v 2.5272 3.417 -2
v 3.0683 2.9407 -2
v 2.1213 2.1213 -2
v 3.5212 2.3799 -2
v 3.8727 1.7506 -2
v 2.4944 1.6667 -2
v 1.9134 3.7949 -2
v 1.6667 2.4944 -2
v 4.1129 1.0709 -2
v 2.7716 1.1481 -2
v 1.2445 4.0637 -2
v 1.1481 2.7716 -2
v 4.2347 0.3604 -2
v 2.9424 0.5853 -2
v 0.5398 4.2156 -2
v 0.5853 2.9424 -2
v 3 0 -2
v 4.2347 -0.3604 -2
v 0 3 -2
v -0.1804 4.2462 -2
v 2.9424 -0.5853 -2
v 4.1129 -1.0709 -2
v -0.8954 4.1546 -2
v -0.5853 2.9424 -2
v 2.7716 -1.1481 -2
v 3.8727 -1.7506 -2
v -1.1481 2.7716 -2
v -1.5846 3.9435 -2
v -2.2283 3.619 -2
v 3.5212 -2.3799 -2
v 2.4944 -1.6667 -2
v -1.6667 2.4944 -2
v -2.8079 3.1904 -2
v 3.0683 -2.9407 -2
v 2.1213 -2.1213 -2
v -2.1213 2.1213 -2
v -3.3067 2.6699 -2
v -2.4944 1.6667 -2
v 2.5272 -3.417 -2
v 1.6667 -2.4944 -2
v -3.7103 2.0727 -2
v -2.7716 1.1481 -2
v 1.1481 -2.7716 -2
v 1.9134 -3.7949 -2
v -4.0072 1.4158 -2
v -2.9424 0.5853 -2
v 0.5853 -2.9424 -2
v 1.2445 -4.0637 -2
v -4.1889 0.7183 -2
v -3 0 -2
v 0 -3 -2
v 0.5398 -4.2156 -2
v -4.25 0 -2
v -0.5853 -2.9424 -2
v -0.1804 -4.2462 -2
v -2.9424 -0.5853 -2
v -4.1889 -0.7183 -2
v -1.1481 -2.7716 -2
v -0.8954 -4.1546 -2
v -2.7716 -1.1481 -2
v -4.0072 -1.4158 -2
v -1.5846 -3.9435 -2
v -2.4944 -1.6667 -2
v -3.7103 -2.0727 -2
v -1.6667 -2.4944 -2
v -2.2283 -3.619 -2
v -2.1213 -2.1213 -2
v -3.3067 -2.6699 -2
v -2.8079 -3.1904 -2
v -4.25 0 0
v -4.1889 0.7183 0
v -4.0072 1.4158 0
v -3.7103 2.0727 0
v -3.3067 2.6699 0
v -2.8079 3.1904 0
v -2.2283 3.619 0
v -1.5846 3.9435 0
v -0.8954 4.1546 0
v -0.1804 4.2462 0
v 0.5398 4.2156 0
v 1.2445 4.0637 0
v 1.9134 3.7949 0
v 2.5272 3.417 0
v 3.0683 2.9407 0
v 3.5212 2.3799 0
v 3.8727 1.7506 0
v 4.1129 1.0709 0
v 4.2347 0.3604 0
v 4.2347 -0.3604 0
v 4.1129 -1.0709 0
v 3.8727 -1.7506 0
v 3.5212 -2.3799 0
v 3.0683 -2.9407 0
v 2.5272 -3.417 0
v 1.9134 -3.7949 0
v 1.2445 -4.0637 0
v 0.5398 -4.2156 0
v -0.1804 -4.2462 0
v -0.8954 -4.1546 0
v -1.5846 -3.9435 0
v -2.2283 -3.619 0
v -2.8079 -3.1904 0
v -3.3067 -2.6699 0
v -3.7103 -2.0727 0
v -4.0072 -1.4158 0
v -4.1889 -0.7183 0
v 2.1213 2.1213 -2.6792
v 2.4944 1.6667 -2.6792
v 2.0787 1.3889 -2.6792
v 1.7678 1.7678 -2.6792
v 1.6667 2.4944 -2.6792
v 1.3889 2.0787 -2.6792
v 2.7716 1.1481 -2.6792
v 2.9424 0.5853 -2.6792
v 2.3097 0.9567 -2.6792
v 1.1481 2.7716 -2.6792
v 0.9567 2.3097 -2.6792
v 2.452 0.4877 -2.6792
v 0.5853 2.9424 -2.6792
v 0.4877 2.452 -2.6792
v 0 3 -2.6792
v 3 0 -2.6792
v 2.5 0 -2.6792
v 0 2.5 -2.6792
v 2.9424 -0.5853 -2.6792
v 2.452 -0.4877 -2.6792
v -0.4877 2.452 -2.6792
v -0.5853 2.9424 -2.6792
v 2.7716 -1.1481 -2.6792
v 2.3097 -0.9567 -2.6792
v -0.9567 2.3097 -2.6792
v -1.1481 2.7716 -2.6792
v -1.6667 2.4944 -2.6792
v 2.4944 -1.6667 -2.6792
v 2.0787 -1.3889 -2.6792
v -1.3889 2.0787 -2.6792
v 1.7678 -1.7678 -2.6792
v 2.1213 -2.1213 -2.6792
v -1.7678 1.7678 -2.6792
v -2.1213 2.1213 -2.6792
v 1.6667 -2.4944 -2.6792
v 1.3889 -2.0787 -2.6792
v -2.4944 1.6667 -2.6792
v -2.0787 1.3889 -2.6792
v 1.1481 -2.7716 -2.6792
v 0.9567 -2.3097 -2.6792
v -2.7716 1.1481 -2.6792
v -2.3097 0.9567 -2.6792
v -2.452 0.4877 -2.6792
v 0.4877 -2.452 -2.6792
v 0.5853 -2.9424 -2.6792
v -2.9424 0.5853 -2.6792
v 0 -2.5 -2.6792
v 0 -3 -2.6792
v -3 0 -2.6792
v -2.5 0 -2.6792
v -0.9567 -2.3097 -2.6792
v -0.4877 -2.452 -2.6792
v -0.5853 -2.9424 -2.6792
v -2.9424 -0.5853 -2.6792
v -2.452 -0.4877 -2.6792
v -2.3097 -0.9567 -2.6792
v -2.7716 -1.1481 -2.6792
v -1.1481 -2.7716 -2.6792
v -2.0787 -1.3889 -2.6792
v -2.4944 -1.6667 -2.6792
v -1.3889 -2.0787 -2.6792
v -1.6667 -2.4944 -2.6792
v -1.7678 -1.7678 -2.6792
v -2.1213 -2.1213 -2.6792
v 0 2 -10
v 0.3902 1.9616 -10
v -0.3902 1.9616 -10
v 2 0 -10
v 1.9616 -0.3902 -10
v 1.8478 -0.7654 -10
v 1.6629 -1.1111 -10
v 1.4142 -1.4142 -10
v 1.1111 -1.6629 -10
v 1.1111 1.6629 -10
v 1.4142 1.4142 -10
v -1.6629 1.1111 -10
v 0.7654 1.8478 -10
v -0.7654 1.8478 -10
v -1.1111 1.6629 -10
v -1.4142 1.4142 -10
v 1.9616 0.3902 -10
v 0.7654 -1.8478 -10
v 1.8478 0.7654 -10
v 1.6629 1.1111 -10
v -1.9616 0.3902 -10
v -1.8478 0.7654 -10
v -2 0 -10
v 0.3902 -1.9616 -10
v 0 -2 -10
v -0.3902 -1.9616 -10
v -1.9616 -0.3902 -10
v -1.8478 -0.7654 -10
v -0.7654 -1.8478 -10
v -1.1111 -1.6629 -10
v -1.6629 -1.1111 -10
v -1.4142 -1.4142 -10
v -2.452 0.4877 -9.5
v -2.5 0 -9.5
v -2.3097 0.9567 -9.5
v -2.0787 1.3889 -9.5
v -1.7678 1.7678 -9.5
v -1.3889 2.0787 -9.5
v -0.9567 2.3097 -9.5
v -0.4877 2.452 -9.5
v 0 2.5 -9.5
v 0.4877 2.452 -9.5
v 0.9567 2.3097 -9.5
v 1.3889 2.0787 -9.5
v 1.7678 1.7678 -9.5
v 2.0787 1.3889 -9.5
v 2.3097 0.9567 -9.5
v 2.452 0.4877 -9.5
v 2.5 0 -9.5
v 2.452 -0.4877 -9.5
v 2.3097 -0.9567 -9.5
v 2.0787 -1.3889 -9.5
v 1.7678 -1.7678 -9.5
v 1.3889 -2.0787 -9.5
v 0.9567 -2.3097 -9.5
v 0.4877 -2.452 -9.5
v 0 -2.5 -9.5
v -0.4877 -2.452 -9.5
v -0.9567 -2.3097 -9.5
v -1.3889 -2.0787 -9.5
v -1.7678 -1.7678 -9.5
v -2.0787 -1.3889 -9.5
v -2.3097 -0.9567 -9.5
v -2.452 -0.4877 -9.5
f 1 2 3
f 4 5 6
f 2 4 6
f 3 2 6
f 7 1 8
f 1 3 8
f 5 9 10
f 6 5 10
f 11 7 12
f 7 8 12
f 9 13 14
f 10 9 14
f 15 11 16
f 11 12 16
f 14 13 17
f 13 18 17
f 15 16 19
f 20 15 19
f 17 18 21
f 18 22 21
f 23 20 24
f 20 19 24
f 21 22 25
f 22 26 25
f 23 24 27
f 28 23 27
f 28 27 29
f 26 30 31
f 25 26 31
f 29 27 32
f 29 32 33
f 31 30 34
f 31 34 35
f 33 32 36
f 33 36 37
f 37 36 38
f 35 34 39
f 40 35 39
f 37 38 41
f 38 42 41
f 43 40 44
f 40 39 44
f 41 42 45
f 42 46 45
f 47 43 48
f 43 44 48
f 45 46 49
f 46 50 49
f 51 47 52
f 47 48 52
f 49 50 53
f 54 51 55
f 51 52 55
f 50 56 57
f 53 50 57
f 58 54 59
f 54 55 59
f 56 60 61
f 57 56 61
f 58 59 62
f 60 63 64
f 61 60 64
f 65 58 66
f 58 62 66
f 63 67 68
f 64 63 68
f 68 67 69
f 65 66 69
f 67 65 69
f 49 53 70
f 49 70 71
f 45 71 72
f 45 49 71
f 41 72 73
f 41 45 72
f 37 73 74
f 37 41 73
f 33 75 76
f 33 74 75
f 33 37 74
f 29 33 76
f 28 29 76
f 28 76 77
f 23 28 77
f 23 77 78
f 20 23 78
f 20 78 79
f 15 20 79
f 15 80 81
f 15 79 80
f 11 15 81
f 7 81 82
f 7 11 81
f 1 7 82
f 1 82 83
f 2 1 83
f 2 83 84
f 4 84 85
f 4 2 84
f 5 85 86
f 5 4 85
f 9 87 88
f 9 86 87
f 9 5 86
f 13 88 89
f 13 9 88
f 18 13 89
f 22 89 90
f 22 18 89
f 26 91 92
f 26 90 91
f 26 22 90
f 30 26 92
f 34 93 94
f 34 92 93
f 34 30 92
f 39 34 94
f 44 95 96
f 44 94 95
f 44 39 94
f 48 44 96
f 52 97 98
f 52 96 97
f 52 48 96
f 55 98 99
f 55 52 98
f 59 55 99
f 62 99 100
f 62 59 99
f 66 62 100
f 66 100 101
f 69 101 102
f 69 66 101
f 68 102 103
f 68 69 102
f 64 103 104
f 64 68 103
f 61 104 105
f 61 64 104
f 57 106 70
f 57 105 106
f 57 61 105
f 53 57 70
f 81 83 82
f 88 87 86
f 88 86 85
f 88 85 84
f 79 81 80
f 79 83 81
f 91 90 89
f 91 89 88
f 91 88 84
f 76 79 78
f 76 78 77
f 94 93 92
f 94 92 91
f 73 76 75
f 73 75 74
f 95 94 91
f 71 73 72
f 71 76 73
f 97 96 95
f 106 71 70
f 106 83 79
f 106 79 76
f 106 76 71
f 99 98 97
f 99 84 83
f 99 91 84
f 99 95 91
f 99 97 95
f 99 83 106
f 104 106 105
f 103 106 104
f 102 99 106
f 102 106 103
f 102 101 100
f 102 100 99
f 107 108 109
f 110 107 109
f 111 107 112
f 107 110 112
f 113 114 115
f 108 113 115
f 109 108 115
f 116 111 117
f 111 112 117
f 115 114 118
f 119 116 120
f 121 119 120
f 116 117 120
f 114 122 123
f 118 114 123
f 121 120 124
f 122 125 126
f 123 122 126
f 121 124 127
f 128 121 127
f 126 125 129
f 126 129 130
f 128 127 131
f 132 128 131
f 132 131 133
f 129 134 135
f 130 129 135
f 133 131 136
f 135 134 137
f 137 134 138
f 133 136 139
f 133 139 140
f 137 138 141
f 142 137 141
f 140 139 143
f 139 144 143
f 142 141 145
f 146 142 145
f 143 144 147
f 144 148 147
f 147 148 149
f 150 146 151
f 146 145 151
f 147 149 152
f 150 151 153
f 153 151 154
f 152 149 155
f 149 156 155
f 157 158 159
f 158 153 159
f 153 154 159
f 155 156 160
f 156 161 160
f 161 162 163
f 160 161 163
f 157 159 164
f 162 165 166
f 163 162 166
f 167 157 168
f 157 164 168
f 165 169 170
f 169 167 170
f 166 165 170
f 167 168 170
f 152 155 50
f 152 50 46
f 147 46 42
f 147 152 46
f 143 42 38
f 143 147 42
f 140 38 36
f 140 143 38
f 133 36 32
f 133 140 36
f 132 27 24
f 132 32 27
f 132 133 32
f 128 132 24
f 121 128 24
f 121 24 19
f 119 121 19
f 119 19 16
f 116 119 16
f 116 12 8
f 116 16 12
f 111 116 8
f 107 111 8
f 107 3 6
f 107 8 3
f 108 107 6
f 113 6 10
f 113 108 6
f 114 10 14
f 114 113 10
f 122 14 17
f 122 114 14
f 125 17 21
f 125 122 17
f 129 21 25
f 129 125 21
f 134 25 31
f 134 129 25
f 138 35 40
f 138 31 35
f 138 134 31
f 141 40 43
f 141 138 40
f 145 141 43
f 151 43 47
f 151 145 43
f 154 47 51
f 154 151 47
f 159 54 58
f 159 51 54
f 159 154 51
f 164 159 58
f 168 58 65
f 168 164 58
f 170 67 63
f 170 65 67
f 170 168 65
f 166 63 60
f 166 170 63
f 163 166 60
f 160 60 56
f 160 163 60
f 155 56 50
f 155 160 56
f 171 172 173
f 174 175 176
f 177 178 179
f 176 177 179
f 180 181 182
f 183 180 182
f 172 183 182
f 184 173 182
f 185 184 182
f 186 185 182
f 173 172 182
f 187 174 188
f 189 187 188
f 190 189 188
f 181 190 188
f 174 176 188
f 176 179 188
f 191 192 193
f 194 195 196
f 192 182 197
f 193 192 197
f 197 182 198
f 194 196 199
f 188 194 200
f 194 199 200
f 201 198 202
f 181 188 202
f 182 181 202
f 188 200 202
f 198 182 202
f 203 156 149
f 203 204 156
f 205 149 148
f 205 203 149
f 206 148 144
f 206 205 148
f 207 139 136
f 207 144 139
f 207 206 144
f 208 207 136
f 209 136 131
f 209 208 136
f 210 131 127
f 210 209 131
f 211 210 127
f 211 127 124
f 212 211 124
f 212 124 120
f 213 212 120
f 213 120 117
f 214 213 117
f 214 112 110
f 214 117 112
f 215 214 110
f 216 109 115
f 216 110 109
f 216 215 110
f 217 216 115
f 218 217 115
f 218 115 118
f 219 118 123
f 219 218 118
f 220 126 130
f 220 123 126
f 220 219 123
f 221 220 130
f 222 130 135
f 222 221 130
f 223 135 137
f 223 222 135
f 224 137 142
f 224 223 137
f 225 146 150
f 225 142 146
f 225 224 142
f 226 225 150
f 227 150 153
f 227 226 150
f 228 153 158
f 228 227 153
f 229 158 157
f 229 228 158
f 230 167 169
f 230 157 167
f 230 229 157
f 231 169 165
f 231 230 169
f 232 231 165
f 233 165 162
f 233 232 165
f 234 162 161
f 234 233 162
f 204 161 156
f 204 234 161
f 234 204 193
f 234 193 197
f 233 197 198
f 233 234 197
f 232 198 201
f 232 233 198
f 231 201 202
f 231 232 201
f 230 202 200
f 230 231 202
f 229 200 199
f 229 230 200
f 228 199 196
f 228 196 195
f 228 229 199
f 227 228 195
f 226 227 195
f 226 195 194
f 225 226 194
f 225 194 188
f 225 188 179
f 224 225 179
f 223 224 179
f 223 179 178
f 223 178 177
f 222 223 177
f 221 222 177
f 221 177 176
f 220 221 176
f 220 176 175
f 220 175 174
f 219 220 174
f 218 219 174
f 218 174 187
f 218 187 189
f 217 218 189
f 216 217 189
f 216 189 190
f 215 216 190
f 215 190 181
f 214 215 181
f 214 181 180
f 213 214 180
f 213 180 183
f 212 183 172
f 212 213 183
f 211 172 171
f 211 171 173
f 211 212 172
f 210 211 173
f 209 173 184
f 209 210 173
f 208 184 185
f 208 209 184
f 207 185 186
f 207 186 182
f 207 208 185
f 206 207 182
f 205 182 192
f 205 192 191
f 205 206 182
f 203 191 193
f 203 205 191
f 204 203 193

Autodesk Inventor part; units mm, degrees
ref_plane "YZ Plane" through (0, 0, 0) normal (1, 0, 0) x (0, 1, 0)
ref_plane "XZ Plane" through (0, 0, 0) normal (0, 1, 0) x (-1, 0, 0)
ref_plane "XY Plane" through (0, 0, 0) normal (0, 0, 1) x (1, 0, 0)
sketch "Эскиз1" plane through (0, 0, 0) normal (0, 1, 0) x (-1, 0, 0)
  line L0 (0, 0) -> (4.25, 0)
  line L1 (4.25, 0) -> (4.25, -2)
  line L2 (0, -2) -> (2.5, -2)
  line L3 (2.5, -2.6792) -> (2.5, -10)
  line L4 (2.5, -10) -> (0, -10)
  line L5 (0, -10) -> (0, -2)
  line L6 (2.5, -2) -> (3, -2)
  line L7 (3, -2) -> (3, -2.6792)
  line L8 (3, -2.6792) -> (2.5, -2.6792)
  line L9 (3, -2) -> (4.25, -2)
  line L10 (0, 0) -> (0, -2)
  dimension "d0" = 4.25
  dimension "d1" = 2
  dimension "d3" = 8
  dimension "d4" = 0.5
revolve "Вращение1" add sketch "Эскиз1" angle 360 about axis through (0, 0, -10) along (0, 0, 1)
thread "Резьба1" size "M5x0.8" class "6g" standard "ISO Metric profile" full length
chamfer "Фаска1" distance 0.5 angle 45 1 edges at (2.5, 0, -10)
properties part number "Болт штурвал"
